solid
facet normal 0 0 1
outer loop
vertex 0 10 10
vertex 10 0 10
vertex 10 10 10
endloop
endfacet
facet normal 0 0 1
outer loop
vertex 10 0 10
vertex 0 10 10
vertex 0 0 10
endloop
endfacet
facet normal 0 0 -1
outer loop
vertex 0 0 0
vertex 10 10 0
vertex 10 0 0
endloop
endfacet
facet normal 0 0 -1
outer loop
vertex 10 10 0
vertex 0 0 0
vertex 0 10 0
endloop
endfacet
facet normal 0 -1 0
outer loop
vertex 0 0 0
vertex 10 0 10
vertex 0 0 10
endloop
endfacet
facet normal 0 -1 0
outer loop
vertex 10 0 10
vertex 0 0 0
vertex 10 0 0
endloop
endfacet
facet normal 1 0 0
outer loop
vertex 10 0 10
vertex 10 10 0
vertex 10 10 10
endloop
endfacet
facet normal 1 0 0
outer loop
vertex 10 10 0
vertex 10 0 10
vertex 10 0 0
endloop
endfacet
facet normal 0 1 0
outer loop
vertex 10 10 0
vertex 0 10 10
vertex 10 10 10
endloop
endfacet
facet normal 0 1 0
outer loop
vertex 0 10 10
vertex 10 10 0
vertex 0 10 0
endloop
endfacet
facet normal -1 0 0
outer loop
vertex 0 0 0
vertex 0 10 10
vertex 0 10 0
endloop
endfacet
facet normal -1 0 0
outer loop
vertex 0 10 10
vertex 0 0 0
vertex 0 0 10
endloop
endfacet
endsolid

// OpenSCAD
// Generated by CadMonkey
// Prompt: hey cadmonkey, create me a cube
// Generated at: 2025-11-10 21:30:09

cube(size = 10);
